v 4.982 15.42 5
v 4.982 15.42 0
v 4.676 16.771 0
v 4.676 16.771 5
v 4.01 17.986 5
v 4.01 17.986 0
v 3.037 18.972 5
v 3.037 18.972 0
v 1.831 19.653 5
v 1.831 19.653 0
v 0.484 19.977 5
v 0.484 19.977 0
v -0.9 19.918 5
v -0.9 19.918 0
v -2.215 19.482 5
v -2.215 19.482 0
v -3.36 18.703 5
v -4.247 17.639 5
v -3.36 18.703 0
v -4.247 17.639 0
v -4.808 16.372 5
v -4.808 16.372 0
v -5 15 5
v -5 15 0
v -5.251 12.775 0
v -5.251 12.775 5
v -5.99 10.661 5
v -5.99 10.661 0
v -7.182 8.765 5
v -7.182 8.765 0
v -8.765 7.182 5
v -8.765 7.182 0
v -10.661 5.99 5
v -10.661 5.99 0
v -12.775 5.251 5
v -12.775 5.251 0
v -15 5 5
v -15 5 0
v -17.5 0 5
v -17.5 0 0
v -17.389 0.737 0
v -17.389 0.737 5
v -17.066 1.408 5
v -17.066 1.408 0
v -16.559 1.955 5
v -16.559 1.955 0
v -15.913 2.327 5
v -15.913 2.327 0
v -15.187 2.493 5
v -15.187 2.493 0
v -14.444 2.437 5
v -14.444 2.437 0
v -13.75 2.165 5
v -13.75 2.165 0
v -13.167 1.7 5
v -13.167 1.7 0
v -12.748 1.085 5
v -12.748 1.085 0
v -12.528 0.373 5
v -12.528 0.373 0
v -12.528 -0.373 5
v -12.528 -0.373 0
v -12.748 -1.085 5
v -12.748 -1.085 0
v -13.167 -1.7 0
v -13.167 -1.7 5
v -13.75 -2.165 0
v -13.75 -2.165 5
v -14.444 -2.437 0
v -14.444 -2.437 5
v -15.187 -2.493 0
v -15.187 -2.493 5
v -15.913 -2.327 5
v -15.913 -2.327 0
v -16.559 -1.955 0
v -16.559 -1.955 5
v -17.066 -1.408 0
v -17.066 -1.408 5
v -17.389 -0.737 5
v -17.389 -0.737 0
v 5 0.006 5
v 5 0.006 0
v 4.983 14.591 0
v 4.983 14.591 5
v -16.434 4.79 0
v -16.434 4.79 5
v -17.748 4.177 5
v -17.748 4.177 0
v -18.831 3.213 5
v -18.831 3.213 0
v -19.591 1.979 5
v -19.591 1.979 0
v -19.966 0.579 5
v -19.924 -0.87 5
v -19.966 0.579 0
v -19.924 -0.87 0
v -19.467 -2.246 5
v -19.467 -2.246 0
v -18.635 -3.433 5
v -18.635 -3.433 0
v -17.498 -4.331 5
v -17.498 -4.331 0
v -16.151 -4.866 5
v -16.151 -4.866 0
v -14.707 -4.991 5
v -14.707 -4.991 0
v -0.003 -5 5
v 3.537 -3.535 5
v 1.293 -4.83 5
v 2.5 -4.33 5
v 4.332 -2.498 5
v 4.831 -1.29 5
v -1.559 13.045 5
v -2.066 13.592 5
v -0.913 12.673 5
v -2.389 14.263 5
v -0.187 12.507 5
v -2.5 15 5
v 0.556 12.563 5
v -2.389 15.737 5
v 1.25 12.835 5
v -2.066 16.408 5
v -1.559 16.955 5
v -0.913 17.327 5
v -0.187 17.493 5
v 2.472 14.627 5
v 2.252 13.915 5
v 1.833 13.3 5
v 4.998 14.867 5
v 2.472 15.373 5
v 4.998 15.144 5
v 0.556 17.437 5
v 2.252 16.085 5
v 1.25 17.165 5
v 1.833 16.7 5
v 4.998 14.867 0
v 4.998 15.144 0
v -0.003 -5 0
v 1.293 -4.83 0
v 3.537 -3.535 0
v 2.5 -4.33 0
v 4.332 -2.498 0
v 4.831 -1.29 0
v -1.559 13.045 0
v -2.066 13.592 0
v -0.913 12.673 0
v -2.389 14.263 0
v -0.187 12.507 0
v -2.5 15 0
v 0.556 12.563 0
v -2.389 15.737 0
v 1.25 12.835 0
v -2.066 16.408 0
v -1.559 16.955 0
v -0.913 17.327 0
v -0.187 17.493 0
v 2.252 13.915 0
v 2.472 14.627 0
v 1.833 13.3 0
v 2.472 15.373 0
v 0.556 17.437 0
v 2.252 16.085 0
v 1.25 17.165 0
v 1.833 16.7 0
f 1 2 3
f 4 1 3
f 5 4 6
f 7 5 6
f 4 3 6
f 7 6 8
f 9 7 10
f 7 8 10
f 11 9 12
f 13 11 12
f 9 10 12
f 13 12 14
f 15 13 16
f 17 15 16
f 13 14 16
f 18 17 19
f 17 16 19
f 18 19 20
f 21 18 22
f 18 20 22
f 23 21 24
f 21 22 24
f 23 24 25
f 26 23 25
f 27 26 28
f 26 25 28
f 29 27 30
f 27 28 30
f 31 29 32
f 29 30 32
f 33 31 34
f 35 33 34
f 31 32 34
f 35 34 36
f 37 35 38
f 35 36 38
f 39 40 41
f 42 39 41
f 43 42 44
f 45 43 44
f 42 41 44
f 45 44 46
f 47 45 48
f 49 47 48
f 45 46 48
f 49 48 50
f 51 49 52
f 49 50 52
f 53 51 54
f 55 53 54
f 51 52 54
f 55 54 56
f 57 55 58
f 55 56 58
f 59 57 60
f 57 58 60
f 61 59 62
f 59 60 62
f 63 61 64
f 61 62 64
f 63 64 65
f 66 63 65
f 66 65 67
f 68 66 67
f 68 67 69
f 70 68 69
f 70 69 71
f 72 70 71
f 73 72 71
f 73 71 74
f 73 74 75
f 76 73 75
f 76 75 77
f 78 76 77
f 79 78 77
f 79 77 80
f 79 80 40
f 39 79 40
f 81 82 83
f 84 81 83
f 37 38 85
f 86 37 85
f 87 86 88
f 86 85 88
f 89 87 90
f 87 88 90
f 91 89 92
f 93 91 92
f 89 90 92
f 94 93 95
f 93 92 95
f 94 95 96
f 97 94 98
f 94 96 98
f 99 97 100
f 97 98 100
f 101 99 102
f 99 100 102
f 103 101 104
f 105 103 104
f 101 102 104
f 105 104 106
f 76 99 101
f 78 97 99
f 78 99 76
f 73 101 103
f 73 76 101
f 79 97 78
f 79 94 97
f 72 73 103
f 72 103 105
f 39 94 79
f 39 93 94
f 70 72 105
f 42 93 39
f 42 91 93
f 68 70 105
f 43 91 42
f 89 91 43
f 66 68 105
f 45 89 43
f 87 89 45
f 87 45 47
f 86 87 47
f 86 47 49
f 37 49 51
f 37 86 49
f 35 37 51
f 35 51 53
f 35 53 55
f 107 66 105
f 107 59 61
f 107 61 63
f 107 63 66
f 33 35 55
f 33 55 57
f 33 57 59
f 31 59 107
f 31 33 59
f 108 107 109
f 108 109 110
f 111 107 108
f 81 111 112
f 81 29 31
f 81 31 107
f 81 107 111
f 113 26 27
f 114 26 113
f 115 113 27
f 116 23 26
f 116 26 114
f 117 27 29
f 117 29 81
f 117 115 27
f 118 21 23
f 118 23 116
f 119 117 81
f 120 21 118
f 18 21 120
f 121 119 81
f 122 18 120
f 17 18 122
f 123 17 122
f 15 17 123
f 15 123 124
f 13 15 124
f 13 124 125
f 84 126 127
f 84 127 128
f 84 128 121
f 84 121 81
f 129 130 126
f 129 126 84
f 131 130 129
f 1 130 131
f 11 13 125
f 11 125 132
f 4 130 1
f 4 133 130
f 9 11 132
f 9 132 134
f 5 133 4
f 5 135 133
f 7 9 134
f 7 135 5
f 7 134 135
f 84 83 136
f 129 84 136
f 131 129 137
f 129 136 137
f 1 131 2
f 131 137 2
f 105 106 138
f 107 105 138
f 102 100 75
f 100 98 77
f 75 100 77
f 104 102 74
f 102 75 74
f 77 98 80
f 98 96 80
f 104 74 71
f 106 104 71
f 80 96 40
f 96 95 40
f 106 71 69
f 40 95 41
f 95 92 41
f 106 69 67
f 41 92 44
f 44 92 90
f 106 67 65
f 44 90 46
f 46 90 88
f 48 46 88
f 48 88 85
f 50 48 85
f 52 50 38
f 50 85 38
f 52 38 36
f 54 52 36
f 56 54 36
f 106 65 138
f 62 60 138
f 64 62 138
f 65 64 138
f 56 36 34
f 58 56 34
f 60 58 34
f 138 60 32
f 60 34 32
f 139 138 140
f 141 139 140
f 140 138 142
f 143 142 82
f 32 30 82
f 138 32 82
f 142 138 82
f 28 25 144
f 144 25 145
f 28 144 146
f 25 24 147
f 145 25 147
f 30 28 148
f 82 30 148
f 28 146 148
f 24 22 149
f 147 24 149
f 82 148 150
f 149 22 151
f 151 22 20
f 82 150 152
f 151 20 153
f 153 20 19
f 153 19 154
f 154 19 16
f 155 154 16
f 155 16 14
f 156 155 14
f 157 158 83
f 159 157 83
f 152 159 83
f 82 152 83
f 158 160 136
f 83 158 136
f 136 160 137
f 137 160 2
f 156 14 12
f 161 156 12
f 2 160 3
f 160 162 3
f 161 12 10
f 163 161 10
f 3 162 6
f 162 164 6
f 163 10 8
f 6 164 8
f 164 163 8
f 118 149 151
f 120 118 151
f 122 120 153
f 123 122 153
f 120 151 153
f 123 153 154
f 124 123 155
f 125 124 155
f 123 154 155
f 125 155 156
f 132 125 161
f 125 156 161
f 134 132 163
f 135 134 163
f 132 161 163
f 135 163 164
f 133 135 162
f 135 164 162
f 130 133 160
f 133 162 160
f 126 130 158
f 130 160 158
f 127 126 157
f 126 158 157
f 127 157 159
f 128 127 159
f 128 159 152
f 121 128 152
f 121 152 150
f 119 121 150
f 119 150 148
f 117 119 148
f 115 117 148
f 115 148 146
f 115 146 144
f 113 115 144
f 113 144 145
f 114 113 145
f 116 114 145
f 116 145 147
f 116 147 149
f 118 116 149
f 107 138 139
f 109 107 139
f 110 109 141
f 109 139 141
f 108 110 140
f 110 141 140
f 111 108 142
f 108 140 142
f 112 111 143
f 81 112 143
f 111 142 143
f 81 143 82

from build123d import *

# Parameters (mm, degrees)
F1_DEPTH = 5
F3_D     = 5


with BuildPart() as f1:
    # F0 (on Top) → F1 (new body)
    with BuildSketch(Plane.XY):
        with BuildLine():
            Line((-14.706516, -4.991379), (-0.002931, -4.999999))
            ThreePointArc((-0.002931, -4.999999), (3.536527, -3.53454), (4.999997, 0.005741))
            Line((4.999997, 0.005741), (4.98325, 14.591081))
            Line((4.98325, 14.591081), (4.982298, 15.420361))
            ThreePointArc((4.982298, 15.420361), (-0.210367, 19.995573), (-5, 15))
            ThreePointArc((-5, 15), (-7.928932, 7.928932), (-15, 5))
            ThreePointArc((-15, 5), (-19.997844, -0.146805), (-14.706516, -4.991379))
        make_face()
        with BuildLine():
            Line((4.982298, 15.420361), (4.98325, 14.591081))
            ThreePointArc((4.98325, 14.591081), (4.999997, 15.005741), (4.982298, 15.420361))
        make_face()
    extrude(amount=F1_DEPTH)

    # F3 (through all)
    with Locations(Plane.XY.offset(5)):
        with Locations((0, 15), (-15, 0)):
            Hole(F3_D / 2)


solid = f1.part
